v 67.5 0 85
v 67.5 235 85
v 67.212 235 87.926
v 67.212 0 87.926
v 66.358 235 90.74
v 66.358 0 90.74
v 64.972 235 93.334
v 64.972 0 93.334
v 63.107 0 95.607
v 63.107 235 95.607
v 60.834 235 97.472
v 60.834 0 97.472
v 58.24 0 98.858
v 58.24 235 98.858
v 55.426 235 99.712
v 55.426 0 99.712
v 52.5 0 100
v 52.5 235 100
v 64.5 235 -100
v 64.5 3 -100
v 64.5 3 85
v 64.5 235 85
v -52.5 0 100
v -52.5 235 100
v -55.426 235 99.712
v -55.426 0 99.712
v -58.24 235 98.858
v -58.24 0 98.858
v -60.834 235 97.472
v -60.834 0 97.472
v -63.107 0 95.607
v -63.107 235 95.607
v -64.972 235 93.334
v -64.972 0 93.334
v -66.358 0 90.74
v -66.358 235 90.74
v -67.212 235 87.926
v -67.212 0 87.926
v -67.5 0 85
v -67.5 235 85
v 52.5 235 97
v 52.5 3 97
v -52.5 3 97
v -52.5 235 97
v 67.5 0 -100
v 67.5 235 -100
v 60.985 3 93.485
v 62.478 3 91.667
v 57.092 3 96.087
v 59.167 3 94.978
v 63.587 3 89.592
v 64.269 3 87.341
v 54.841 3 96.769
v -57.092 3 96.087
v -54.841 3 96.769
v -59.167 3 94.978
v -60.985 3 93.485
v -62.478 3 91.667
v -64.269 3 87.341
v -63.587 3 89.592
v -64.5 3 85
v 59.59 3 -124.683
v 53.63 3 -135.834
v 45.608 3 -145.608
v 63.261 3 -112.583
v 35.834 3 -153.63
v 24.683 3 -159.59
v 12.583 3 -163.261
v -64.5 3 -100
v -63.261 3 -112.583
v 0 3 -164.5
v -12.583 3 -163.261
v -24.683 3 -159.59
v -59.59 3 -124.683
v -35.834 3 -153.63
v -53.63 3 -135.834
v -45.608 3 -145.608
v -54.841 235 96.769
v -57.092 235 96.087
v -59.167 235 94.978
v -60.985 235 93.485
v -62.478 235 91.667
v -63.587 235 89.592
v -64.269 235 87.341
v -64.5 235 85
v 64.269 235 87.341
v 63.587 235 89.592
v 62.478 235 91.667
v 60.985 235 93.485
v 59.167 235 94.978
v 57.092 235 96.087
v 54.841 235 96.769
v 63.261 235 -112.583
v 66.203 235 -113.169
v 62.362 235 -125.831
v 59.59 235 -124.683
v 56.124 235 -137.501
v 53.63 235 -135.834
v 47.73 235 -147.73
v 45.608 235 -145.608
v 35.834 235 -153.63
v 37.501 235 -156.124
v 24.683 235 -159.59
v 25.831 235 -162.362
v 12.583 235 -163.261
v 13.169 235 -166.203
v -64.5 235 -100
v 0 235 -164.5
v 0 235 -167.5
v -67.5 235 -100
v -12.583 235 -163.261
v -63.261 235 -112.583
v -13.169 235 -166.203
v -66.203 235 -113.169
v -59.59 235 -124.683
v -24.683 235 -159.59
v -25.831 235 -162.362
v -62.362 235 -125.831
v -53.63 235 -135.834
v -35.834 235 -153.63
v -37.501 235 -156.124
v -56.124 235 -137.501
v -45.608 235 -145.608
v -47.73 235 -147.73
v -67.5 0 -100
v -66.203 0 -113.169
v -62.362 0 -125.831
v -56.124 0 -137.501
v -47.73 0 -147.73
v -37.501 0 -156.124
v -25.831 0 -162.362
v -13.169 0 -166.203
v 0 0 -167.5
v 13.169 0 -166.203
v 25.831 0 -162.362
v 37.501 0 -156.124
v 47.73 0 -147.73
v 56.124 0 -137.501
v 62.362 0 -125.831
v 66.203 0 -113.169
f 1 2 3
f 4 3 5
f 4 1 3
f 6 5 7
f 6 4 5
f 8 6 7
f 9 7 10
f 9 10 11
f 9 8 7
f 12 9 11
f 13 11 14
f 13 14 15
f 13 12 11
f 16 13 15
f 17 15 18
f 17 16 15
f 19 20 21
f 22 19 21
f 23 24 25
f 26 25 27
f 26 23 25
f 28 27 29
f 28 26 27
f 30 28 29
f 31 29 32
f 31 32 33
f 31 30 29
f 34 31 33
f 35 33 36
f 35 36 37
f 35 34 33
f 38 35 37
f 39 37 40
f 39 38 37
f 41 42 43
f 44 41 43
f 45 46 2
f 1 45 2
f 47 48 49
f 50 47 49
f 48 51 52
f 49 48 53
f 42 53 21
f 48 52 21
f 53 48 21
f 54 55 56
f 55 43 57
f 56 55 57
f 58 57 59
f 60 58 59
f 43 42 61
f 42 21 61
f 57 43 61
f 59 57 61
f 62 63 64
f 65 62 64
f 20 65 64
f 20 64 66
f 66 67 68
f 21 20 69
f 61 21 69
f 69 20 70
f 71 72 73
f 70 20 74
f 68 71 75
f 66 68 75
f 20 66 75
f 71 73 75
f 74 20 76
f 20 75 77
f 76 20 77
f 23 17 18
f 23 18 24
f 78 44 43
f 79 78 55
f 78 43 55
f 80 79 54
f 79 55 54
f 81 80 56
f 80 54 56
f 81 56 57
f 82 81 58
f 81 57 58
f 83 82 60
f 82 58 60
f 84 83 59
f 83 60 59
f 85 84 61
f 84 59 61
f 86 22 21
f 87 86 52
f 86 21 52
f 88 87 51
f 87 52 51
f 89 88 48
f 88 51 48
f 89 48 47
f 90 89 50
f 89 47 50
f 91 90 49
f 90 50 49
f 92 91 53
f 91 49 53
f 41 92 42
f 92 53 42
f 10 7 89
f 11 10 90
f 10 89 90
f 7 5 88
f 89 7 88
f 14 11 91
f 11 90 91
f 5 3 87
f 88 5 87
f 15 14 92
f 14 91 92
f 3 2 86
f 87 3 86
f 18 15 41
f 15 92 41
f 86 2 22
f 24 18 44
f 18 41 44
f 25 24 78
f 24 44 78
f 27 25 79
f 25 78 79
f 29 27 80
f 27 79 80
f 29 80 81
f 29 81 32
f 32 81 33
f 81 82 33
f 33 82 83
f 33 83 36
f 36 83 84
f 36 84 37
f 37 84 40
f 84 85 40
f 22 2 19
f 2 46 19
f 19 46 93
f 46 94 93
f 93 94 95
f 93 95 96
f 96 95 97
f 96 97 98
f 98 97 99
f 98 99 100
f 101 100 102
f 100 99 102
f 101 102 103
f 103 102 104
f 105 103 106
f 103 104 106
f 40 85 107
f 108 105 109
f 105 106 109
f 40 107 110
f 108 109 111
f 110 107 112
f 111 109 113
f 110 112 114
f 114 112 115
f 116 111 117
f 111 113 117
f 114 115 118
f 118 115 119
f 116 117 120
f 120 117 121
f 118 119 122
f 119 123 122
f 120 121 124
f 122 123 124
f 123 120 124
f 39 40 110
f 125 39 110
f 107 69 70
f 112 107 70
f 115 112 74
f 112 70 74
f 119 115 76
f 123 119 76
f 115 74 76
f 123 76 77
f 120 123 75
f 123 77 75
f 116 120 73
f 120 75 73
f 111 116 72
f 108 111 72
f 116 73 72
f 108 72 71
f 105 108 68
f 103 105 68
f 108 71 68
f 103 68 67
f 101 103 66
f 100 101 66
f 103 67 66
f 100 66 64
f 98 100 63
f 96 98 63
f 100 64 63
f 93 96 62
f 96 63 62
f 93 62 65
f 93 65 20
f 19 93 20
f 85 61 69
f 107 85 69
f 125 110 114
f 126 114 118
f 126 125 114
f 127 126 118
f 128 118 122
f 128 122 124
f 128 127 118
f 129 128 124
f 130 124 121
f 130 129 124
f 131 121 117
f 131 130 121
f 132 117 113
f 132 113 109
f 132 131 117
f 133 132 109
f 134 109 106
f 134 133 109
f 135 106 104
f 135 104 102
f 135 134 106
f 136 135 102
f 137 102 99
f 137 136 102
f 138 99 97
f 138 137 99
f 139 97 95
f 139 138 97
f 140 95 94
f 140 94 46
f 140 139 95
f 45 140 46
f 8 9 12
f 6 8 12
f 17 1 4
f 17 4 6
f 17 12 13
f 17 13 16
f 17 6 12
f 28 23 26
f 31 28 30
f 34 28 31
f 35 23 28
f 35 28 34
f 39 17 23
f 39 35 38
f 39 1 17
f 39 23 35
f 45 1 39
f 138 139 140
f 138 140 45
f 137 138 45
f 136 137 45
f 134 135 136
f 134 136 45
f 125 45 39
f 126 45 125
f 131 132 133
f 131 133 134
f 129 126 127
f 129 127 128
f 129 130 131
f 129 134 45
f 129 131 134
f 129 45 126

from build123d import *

# Parameters (mm, degrees)
BOSS_EXTRUDE1_DEPTH = 235
SHELL1_T            = -3


with BuildPart() as part:
    # Sketch1 → Boss-Extrude1 (new body)
    with BuildSketch(Plane(origin=(0, 0, 0), x_dir=(1, 0, 0), z_dir=(0, 1, 0))):
        with BuildLine():
            Line((52.5, -100), (-52.5, -100))
            ThreePointArc((-52.5, -100), (-63.106601718, -95.606601718), (-67.5, -85))
            Line((-67.5, -85), (-67.5, 100))
            ThreePointArc((-67.5, 100), (0, 167.5), (67.5, 100))
            Line((67.5, 100), (67.5, -85))
            ThreePointArc((67.5, -85), (63.106601718, -95.606601718), (52.5, -100))
        make_face()
    extrude(amount=BOSS_EXTRUDE1_DEPTH)

    # Shell1
    shell1_openings = [part.faces().sort_by_distance(p)[0] for p in [
        (0, 235, 18.118867239),
    ]]
    offset(amount=SHELL1_T, openings=shell1_openings, kind=Kind.INTERSECTION)


solid = part.part
